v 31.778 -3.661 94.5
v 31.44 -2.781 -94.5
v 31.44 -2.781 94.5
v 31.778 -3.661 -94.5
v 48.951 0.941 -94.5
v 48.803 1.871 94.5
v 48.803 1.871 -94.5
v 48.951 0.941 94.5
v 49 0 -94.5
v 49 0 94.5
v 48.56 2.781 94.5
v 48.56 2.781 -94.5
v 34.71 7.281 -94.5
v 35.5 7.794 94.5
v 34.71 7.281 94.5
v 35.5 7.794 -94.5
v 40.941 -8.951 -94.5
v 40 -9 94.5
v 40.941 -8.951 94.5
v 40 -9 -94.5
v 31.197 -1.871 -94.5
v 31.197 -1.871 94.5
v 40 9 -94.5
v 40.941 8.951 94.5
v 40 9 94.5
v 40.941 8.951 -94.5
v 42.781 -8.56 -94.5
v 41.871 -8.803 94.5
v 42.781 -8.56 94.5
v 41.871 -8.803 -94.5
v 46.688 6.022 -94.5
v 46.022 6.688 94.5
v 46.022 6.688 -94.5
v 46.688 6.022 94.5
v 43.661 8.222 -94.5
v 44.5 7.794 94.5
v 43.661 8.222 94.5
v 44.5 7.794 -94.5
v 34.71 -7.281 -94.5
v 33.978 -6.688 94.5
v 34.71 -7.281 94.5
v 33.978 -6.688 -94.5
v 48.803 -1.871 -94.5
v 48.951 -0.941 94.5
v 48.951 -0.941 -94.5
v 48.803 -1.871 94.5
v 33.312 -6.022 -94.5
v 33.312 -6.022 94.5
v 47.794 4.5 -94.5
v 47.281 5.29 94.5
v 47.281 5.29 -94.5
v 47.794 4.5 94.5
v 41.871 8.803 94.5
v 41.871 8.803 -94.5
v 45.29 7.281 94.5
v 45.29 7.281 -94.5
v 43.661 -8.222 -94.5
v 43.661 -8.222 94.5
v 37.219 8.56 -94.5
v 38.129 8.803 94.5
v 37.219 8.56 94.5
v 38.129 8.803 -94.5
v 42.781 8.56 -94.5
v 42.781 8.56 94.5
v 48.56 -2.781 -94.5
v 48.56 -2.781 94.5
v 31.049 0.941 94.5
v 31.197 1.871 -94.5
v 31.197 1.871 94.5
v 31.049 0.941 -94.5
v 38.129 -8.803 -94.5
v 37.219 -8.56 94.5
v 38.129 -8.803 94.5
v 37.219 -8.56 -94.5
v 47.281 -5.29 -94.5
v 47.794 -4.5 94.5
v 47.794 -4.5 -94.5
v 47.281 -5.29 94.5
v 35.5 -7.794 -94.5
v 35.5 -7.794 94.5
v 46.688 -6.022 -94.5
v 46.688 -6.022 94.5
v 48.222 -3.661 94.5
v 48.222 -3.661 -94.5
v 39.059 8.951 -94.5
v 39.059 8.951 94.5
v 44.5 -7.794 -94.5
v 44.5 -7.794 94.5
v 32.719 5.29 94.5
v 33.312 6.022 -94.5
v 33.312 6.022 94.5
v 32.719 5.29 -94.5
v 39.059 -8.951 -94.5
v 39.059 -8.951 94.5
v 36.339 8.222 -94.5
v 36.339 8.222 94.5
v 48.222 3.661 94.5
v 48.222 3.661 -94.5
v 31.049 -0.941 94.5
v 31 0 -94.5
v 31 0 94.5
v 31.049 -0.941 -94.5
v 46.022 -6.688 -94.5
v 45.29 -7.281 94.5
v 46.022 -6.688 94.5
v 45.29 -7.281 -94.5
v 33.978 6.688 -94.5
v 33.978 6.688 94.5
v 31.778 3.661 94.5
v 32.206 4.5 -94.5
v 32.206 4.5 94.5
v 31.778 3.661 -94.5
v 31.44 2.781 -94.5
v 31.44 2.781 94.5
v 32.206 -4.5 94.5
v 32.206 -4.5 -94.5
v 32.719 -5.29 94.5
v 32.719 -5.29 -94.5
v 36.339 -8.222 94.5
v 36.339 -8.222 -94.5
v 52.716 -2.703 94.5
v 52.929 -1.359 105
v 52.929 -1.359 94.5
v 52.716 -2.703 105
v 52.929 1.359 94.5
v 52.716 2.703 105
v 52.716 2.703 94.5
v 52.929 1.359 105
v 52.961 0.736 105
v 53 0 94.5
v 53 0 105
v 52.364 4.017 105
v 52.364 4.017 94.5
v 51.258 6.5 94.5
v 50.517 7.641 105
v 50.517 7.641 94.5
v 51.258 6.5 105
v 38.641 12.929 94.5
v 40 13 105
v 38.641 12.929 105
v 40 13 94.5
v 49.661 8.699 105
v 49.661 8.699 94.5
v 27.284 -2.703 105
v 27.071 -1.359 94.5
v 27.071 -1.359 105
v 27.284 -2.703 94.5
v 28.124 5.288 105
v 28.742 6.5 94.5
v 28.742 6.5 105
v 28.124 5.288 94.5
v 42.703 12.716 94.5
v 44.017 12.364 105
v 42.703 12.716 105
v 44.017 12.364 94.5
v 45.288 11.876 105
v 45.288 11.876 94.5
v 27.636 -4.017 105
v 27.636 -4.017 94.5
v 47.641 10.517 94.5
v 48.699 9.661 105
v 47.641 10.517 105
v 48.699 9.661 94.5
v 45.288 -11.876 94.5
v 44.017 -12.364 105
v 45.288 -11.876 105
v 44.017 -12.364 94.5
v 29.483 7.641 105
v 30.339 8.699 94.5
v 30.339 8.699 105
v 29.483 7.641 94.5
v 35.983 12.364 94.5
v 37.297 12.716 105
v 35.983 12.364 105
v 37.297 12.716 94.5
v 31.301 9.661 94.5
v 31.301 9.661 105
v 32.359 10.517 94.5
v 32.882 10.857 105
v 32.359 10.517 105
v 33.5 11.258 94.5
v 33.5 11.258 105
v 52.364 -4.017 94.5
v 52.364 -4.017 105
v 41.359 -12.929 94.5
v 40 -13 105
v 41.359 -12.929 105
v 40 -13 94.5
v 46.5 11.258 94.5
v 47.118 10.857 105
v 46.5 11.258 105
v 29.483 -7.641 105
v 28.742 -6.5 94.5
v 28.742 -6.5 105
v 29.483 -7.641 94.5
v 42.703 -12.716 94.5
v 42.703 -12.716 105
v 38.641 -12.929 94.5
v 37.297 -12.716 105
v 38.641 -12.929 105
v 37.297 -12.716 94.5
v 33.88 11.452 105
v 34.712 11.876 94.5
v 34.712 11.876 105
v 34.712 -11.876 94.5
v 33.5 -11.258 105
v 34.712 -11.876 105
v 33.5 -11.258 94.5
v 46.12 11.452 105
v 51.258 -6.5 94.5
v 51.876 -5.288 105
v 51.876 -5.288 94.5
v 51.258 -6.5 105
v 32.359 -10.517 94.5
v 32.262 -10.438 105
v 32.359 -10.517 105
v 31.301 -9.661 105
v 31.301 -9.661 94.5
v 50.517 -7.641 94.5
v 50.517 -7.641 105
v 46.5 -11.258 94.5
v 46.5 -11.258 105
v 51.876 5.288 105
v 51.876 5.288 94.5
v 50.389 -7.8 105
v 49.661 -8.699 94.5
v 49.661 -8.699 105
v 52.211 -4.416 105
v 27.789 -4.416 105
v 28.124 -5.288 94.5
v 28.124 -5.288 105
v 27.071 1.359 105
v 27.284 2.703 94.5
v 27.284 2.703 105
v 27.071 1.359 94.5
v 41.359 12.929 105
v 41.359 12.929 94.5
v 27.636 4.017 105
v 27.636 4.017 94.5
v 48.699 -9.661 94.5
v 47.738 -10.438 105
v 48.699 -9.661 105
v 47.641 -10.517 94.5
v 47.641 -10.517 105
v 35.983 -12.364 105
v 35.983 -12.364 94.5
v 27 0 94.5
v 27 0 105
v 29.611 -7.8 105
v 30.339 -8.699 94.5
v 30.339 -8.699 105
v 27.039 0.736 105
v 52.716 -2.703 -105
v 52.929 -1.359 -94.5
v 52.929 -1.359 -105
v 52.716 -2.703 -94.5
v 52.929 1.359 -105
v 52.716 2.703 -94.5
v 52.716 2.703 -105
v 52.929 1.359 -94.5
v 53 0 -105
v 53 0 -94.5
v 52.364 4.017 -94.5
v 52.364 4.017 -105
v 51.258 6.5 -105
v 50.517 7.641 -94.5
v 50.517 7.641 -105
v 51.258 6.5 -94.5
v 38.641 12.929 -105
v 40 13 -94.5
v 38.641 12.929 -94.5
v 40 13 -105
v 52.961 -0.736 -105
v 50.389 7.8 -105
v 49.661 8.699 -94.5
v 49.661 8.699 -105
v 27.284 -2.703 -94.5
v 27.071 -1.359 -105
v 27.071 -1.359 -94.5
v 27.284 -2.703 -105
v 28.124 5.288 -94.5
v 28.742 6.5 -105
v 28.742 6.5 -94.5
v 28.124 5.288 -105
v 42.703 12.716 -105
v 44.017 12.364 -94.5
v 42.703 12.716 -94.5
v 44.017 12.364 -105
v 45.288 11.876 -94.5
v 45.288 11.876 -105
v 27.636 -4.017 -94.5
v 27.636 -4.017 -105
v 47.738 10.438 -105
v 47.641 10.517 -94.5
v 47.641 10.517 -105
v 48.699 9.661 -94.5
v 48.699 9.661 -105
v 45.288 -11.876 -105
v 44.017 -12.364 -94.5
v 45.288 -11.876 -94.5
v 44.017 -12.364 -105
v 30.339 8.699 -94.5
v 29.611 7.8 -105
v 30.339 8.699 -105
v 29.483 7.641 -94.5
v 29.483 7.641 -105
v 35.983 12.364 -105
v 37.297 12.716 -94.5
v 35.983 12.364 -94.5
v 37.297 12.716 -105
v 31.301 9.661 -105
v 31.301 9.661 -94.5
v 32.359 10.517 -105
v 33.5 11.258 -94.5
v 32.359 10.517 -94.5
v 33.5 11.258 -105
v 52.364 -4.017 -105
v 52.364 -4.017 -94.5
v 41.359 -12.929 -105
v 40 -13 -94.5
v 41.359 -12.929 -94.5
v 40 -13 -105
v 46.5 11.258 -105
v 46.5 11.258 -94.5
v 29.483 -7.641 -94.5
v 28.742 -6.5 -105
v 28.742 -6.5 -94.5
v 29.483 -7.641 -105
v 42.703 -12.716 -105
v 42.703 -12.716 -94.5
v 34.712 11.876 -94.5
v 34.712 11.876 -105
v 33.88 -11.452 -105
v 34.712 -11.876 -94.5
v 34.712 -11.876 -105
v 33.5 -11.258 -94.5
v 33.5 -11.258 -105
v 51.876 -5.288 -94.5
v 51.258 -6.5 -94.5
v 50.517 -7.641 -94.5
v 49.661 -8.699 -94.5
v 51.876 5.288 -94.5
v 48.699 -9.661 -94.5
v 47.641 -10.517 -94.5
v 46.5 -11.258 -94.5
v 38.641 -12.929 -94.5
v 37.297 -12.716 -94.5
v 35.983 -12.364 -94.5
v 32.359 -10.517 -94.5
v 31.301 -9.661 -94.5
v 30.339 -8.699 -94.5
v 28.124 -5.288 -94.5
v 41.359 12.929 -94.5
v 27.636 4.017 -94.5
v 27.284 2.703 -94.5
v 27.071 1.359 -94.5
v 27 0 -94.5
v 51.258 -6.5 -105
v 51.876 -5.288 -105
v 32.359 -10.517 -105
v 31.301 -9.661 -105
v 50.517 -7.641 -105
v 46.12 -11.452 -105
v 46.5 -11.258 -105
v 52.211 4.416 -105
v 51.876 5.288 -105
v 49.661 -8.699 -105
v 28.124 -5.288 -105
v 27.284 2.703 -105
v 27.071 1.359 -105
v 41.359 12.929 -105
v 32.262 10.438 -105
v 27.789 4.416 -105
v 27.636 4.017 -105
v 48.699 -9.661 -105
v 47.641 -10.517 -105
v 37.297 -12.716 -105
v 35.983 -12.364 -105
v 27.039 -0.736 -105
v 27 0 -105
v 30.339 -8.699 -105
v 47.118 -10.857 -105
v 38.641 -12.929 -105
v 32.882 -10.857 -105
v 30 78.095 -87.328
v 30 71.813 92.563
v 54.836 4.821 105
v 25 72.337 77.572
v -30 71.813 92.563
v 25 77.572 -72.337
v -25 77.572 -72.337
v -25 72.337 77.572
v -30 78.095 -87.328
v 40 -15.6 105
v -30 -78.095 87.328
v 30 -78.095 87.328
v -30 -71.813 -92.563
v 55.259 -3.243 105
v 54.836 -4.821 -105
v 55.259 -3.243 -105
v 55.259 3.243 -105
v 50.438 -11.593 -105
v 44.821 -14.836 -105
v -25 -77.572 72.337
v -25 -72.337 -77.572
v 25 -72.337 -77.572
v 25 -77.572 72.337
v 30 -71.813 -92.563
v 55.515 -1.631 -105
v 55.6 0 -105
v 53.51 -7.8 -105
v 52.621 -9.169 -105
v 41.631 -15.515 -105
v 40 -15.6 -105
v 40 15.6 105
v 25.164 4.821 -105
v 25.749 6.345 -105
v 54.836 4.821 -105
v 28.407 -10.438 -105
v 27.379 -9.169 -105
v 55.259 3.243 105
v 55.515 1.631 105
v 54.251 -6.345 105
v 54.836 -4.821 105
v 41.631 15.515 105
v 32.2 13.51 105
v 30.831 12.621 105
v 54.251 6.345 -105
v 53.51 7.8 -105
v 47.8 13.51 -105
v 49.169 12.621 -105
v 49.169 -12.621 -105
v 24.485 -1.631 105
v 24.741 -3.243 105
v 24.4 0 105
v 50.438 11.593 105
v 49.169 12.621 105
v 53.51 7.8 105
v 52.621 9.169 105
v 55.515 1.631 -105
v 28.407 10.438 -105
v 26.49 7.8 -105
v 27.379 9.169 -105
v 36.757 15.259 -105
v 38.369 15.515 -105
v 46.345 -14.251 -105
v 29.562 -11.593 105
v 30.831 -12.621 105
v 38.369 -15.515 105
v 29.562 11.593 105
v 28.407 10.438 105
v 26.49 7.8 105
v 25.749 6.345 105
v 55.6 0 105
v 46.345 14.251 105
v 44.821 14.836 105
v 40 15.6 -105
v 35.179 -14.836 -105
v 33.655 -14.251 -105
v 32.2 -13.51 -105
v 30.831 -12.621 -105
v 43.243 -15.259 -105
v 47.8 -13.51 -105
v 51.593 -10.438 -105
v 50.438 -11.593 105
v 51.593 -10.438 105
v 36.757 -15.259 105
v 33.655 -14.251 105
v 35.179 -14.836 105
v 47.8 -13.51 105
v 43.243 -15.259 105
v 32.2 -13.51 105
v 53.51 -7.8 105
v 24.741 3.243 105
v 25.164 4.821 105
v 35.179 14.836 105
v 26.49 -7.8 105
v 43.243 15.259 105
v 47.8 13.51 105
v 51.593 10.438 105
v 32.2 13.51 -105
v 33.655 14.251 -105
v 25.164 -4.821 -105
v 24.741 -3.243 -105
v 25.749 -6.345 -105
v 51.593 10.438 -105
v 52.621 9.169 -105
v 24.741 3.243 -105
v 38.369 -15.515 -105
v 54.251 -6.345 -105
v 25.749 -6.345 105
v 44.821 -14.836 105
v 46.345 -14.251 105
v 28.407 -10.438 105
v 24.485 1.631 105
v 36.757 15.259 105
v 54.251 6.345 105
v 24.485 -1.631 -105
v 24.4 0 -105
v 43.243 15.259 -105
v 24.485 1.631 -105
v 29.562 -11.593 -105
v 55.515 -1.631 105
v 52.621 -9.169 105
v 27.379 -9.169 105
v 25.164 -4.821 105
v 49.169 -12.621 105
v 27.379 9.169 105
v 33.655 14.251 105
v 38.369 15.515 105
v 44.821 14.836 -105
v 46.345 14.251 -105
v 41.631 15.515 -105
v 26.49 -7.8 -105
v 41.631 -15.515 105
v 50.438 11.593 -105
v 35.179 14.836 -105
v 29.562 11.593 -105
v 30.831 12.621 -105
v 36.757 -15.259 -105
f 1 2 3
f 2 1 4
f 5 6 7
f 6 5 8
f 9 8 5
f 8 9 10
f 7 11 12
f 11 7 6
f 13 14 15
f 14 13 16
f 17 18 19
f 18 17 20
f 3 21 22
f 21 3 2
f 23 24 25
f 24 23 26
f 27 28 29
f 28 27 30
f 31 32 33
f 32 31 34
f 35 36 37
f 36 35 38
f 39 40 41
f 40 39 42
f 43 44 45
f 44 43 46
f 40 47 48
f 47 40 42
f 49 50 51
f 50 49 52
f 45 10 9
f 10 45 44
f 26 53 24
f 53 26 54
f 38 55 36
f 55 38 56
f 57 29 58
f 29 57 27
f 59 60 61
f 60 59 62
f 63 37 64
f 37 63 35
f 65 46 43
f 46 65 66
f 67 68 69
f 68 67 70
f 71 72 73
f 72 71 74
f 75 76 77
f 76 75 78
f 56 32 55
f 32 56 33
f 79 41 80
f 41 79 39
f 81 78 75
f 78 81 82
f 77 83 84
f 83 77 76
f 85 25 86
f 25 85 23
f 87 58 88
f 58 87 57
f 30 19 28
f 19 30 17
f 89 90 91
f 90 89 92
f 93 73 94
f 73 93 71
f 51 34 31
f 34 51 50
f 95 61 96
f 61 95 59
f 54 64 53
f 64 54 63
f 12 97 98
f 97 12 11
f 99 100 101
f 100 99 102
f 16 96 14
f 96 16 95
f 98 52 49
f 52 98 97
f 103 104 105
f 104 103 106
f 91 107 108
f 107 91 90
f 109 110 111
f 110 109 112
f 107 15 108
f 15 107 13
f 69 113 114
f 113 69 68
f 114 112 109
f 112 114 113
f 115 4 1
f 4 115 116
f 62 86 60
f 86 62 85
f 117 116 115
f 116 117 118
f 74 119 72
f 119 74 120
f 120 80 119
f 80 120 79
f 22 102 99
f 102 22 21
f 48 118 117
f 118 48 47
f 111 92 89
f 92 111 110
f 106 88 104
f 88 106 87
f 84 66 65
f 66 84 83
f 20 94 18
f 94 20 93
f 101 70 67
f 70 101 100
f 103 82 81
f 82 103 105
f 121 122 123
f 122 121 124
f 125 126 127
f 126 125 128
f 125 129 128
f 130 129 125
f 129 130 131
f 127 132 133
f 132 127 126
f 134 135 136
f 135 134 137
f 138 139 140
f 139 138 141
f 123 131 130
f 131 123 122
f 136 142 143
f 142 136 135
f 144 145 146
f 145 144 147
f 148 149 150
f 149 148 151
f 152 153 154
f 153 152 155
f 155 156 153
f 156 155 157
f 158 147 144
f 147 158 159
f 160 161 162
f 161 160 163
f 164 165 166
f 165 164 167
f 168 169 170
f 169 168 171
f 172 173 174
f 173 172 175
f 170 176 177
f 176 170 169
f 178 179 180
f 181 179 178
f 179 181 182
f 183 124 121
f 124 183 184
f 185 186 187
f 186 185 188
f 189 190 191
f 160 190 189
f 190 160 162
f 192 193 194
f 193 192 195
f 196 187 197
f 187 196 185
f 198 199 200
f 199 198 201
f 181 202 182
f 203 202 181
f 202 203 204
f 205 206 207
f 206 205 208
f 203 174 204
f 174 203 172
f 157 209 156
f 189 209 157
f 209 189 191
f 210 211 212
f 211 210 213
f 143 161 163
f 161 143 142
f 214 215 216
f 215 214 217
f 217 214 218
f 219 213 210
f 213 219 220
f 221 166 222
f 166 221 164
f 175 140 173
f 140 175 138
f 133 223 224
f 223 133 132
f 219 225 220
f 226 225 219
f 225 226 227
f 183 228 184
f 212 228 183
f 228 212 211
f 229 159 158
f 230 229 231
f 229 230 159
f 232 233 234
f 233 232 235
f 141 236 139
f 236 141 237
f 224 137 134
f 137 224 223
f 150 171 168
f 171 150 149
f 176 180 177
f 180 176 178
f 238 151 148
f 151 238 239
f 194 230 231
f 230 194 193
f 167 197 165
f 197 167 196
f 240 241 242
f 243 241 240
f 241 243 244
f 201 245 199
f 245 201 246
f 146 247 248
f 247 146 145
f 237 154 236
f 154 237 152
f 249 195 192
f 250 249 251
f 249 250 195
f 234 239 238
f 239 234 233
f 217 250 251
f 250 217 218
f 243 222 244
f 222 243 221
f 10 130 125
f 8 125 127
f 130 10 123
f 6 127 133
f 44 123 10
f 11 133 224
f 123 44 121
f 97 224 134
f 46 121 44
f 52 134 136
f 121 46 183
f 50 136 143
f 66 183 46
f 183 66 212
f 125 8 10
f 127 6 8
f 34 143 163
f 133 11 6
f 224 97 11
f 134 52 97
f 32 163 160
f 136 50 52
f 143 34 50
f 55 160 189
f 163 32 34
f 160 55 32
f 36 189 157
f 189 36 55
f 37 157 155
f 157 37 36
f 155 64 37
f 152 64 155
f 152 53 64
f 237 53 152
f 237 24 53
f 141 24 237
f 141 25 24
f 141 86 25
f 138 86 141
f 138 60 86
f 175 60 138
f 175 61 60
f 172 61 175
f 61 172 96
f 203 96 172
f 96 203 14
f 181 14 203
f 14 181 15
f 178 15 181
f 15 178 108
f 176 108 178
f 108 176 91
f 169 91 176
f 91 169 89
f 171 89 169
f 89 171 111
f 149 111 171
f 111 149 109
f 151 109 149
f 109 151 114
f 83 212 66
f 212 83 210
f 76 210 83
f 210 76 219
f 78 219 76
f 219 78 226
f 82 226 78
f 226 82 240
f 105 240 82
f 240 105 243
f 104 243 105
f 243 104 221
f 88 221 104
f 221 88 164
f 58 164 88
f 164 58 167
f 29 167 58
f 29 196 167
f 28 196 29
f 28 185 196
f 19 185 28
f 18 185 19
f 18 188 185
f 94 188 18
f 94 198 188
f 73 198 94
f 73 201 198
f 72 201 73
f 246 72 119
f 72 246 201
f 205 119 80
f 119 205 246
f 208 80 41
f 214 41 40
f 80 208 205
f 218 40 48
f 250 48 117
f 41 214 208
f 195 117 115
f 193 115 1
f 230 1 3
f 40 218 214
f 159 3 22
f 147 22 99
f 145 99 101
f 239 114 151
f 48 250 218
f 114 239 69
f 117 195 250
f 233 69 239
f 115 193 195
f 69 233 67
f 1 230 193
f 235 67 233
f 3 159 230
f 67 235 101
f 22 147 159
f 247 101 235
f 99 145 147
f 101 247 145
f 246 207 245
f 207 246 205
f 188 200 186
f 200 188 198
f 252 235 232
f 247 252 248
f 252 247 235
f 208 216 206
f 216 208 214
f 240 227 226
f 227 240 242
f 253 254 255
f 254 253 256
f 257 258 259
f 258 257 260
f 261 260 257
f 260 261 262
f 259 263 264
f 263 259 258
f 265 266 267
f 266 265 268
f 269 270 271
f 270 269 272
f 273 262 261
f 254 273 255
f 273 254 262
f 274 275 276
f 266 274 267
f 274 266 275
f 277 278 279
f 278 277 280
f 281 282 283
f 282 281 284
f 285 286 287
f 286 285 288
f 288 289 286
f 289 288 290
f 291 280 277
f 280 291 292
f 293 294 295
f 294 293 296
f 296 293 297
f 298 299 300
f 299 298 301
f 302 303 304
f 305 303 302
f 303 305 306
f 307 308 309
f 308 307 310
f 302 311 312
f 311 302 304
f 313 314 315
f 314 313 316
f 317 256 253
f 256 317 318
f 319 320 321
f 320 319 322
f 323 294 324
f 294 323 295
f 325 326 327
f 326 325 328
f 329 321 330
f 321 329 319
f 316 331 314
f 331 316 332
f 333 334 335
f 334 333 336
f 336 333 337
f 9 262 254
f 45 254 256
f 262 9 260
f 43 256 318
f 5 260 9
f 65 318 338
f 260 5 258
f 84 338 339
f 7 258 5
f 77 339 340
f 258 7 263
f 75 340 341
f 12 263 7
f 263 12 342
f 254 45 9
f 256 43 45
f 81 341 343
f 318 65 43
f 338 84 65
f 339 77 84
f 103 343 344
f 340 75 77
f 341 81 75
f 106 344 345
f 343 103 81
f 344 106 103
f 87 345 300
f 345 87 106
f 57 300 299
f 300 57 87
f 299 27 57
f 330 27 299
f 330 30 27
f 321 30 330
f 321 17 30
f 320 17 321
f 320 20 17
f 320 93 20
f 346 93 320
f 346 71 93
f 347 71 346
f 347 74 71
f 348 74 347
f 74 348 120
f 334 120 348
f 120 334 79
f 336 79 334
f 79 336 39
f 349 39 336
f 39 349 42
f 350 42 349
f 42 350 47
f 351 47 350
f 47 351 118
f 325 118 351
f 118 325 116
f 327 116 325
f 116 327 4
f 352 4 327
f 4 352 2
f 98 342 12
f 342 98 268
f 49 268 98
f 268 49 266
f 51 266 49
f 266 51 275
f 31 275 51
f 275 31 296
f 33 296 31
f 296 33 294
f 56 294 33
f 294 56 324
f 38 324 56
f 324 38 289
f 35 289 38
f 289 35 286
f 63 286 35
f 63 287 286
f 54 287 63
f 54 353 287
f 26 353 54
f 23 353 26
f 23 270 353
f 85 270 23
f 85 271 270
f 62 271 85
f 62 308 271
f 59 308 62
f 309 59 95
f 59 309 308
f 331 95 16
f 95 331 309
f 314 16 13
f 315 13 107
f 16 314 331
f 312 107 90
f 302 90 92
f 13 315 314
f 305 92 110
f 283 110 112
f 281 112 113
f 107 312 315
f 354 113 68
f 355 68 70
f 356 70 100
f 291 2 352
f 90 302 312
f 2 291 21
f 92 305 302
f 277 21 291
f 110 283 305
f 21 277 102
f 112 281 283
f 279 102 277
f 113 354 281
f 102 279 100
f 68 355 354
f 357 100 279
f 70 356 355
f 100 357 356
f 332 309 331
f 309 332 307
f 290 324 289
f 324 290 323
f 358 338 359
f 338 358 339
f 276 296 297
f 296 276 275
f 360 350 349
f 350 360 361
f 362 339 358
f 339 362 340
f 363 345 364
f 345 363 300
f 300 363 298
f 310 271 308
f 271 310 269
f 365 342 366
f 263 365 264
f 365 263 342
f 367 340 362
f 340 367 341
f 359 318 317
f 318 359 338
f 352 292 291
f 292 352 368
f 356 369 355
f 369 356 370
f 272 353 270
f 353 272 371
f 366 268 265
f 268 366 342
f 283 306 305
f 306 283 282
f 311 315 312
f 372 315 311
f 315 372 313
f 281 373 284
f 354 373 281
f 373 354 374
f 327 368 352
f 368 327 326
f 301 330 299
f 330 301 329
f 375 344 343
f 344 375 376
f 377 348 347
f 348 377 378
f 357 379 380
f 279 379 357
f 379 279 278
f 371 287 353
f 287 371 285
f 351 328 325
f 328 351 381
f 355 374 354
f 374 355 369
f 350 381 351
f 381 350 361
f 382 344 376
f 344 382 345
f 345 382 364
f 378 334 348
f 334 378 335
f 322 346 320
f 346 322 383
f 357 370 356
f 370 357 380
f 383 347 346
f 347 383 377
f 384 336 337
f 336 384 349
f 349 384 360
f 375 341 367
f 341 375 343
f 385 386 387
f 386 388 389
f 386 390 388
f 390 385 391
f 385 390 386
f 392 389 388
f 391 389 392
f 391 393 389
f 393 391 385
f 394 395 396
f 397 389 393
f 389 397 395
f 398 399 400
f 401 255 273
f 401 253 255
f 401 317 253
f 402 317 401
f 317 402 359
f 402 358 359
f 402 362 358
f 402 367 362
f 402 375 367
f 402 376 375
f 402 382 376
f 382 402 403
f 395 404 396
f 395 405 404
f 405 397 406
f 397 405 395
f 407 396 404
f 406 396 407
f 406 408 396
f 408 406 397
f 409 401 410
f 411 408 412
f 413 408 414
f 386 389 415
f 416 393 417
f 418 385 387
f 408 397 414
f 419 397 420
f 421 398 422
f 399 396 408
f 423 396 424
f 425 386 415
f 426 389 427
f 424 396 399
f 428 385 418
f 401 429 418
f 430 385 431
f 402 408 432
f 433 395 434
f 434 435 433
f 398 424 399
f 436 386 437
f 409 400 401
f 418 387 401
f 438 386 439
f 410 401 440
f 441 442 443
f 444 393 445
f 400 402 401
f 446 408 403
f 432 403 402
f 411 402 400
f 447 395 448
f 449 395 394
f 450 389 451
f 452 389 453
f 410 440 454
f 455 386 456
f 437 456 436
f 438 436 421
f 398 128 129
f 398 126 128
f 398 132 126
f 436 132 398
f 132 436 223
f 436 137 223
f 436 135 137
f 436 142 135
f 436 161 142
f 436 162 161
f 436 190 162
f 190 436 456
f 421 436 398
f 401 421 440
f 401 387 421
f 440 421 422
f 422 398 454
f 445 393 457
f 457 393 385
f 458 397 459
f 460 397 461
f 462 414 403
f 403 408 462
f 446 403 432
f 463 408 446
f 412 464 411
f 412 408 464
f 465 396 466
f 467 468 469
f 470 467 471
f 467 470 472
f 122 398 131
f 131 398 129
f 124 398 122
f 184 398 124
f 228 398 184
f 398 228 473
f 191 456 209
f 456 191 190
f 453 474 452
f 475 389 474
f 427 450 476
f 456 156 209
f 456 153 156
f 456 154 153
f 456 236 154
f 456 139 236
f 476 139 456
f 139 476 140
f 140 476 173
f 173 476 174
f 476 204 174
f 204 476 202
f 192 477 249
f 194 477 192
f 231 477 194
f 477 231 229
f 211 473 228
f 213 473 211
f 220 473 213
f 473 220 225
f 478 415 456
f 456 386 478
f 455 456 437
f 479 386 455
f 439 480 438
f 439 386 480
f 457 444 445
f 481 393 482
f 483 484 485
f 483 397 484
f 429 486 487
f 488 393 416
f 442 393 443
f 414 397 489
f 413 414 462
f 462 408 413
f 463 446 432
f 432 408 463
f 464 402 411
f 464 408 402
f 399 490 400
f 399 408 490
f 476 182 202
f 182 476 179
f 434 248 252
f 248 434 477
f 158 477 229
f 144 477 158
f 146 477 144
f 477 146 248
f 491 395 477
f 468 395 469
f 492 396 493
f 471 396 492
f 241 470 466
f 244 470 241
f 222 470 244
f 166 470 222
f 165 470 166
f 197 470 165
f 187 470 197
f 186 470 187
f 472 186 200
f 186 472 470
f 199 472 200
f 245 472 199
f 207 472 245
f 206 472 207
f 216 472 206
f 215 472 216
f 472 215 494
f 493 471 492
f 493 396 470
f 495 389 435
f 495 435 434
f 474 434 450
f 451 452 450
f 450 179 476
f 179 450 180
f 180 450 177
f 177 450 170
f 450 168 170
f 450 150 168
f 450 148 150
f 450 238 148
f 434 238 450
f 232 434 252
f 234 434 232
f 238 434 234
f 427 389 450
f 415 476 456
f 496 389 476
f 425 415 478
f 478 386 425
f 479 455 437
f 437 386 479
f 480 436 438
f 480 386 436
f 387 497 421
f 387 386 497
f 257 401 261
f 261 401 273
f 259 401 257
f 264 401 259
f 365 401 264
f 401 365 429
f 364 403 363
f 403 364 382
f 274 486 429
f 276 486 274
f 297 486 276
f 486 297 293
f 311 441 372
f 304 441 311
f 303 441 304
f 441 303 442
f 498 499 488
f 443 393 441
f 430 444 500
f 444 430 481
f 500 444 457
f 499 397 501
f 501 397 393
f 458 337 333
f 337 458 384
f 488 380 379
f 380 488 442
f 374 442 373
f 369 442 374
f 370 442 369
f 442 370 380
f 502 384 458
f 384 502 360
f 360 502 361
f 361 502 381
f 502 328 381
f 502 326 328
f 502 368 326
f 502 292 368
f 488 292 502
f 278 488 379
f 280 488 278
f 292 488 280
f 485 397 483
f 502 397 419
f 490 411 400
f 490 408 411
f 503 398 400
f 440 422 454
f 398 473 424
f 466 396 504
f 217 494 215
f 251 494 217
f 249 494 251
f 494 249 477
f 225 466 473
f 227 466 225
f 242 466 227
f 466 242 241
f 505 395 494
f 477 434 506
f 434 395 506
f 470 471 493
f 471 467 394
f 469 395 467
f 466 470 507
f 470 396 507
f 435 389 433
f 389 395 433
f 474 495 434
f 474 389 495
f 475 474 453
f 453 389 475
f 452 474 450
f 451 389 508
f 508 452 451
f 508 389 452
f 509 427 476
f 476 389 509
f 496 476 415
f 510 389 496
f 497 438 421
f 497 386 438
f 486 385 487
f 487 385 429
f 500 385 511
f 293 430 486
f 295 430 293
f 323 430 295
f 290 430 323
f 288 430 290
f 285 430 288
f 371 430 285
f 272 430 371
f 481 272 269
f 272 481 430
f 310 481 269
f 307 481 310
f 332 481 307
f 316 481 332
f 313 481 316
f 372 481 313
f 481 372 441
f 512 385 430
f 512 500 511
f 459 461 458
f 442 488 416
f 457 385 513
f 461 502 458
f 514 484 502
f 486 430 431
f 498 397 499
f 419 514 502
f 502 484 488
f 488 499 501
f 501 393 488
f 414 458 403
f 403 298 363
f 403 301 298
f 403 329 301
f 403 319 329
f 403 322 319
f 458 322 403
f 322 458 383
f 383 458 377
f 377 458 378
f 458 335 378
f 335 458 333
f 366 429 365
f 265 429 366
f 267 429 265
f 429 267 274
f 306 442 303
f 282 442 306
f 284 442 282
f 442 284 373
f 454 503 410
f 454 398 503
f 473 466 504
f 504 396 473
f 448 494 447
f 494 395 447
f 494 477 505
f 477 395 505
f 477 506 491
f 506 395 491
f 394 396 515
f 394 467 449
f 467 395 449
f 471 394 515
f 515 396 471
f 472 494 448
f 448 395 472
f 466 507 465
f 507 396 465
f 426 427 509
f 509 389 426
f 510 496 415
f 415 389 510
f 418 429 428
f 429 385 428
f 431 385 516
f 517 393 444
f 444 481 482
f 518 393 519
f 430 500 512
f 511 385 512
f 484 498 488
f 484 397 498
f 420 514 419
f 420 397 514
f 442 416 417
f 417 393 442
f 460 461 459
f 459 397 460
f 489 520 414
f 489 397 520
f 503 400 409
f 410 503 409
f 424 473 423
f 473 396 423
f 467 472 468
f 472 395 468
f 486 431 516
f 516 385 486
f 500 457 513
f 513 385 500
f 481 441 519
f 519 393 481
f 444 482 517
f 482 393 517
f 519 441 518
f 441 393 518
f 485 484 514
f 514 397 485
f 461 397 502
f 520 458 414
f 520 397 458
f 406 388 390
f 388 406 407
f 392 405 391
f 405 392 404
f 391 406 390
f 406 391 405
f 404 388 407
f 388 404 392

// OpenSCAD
$fn=60;

bearing_od=26;
bearing_id=12;
bearing_h = 10;

width=50;
length=150;
rta=.8;
dim=1.1;
ht=1.4;
angle=88;

module shape()
{
   // cylinder(r=bearing_od/2, h = dim*shaft_d + bearing_h*2, center=true);
}

rotate([-angle,0,0])
difference() { 
    hull() {
       cube([width*1.2, length*1.2, length], center=true);
        translate([width*rta, 0, 0])
          rotate([angle, 0, 0])
            cylinder(r=bearing_od*1.2/2, h=length*ht, center=true);
    }
    translate([0, 0, -dim*width/2-bearing_h/2])
        cube([width, length, length*2], center=true);
    translate([width*rta, 0, 0])
        rotate([angle, 0, 0]) {
           cylinder(r=bearing_id*1.5/2, h=length*ht+1, center=true);
           translate([0, 0, ht*length/2-bearing_h/2])
               cylinder(r=bearing_od/2, h=bearing_h+1, center=true);
           translate([0, 0,-ht*length/2+bearing_h/2])
               cylinder(r=bearing_od/2, h=bearing_h+1, center=true);
        }
}
